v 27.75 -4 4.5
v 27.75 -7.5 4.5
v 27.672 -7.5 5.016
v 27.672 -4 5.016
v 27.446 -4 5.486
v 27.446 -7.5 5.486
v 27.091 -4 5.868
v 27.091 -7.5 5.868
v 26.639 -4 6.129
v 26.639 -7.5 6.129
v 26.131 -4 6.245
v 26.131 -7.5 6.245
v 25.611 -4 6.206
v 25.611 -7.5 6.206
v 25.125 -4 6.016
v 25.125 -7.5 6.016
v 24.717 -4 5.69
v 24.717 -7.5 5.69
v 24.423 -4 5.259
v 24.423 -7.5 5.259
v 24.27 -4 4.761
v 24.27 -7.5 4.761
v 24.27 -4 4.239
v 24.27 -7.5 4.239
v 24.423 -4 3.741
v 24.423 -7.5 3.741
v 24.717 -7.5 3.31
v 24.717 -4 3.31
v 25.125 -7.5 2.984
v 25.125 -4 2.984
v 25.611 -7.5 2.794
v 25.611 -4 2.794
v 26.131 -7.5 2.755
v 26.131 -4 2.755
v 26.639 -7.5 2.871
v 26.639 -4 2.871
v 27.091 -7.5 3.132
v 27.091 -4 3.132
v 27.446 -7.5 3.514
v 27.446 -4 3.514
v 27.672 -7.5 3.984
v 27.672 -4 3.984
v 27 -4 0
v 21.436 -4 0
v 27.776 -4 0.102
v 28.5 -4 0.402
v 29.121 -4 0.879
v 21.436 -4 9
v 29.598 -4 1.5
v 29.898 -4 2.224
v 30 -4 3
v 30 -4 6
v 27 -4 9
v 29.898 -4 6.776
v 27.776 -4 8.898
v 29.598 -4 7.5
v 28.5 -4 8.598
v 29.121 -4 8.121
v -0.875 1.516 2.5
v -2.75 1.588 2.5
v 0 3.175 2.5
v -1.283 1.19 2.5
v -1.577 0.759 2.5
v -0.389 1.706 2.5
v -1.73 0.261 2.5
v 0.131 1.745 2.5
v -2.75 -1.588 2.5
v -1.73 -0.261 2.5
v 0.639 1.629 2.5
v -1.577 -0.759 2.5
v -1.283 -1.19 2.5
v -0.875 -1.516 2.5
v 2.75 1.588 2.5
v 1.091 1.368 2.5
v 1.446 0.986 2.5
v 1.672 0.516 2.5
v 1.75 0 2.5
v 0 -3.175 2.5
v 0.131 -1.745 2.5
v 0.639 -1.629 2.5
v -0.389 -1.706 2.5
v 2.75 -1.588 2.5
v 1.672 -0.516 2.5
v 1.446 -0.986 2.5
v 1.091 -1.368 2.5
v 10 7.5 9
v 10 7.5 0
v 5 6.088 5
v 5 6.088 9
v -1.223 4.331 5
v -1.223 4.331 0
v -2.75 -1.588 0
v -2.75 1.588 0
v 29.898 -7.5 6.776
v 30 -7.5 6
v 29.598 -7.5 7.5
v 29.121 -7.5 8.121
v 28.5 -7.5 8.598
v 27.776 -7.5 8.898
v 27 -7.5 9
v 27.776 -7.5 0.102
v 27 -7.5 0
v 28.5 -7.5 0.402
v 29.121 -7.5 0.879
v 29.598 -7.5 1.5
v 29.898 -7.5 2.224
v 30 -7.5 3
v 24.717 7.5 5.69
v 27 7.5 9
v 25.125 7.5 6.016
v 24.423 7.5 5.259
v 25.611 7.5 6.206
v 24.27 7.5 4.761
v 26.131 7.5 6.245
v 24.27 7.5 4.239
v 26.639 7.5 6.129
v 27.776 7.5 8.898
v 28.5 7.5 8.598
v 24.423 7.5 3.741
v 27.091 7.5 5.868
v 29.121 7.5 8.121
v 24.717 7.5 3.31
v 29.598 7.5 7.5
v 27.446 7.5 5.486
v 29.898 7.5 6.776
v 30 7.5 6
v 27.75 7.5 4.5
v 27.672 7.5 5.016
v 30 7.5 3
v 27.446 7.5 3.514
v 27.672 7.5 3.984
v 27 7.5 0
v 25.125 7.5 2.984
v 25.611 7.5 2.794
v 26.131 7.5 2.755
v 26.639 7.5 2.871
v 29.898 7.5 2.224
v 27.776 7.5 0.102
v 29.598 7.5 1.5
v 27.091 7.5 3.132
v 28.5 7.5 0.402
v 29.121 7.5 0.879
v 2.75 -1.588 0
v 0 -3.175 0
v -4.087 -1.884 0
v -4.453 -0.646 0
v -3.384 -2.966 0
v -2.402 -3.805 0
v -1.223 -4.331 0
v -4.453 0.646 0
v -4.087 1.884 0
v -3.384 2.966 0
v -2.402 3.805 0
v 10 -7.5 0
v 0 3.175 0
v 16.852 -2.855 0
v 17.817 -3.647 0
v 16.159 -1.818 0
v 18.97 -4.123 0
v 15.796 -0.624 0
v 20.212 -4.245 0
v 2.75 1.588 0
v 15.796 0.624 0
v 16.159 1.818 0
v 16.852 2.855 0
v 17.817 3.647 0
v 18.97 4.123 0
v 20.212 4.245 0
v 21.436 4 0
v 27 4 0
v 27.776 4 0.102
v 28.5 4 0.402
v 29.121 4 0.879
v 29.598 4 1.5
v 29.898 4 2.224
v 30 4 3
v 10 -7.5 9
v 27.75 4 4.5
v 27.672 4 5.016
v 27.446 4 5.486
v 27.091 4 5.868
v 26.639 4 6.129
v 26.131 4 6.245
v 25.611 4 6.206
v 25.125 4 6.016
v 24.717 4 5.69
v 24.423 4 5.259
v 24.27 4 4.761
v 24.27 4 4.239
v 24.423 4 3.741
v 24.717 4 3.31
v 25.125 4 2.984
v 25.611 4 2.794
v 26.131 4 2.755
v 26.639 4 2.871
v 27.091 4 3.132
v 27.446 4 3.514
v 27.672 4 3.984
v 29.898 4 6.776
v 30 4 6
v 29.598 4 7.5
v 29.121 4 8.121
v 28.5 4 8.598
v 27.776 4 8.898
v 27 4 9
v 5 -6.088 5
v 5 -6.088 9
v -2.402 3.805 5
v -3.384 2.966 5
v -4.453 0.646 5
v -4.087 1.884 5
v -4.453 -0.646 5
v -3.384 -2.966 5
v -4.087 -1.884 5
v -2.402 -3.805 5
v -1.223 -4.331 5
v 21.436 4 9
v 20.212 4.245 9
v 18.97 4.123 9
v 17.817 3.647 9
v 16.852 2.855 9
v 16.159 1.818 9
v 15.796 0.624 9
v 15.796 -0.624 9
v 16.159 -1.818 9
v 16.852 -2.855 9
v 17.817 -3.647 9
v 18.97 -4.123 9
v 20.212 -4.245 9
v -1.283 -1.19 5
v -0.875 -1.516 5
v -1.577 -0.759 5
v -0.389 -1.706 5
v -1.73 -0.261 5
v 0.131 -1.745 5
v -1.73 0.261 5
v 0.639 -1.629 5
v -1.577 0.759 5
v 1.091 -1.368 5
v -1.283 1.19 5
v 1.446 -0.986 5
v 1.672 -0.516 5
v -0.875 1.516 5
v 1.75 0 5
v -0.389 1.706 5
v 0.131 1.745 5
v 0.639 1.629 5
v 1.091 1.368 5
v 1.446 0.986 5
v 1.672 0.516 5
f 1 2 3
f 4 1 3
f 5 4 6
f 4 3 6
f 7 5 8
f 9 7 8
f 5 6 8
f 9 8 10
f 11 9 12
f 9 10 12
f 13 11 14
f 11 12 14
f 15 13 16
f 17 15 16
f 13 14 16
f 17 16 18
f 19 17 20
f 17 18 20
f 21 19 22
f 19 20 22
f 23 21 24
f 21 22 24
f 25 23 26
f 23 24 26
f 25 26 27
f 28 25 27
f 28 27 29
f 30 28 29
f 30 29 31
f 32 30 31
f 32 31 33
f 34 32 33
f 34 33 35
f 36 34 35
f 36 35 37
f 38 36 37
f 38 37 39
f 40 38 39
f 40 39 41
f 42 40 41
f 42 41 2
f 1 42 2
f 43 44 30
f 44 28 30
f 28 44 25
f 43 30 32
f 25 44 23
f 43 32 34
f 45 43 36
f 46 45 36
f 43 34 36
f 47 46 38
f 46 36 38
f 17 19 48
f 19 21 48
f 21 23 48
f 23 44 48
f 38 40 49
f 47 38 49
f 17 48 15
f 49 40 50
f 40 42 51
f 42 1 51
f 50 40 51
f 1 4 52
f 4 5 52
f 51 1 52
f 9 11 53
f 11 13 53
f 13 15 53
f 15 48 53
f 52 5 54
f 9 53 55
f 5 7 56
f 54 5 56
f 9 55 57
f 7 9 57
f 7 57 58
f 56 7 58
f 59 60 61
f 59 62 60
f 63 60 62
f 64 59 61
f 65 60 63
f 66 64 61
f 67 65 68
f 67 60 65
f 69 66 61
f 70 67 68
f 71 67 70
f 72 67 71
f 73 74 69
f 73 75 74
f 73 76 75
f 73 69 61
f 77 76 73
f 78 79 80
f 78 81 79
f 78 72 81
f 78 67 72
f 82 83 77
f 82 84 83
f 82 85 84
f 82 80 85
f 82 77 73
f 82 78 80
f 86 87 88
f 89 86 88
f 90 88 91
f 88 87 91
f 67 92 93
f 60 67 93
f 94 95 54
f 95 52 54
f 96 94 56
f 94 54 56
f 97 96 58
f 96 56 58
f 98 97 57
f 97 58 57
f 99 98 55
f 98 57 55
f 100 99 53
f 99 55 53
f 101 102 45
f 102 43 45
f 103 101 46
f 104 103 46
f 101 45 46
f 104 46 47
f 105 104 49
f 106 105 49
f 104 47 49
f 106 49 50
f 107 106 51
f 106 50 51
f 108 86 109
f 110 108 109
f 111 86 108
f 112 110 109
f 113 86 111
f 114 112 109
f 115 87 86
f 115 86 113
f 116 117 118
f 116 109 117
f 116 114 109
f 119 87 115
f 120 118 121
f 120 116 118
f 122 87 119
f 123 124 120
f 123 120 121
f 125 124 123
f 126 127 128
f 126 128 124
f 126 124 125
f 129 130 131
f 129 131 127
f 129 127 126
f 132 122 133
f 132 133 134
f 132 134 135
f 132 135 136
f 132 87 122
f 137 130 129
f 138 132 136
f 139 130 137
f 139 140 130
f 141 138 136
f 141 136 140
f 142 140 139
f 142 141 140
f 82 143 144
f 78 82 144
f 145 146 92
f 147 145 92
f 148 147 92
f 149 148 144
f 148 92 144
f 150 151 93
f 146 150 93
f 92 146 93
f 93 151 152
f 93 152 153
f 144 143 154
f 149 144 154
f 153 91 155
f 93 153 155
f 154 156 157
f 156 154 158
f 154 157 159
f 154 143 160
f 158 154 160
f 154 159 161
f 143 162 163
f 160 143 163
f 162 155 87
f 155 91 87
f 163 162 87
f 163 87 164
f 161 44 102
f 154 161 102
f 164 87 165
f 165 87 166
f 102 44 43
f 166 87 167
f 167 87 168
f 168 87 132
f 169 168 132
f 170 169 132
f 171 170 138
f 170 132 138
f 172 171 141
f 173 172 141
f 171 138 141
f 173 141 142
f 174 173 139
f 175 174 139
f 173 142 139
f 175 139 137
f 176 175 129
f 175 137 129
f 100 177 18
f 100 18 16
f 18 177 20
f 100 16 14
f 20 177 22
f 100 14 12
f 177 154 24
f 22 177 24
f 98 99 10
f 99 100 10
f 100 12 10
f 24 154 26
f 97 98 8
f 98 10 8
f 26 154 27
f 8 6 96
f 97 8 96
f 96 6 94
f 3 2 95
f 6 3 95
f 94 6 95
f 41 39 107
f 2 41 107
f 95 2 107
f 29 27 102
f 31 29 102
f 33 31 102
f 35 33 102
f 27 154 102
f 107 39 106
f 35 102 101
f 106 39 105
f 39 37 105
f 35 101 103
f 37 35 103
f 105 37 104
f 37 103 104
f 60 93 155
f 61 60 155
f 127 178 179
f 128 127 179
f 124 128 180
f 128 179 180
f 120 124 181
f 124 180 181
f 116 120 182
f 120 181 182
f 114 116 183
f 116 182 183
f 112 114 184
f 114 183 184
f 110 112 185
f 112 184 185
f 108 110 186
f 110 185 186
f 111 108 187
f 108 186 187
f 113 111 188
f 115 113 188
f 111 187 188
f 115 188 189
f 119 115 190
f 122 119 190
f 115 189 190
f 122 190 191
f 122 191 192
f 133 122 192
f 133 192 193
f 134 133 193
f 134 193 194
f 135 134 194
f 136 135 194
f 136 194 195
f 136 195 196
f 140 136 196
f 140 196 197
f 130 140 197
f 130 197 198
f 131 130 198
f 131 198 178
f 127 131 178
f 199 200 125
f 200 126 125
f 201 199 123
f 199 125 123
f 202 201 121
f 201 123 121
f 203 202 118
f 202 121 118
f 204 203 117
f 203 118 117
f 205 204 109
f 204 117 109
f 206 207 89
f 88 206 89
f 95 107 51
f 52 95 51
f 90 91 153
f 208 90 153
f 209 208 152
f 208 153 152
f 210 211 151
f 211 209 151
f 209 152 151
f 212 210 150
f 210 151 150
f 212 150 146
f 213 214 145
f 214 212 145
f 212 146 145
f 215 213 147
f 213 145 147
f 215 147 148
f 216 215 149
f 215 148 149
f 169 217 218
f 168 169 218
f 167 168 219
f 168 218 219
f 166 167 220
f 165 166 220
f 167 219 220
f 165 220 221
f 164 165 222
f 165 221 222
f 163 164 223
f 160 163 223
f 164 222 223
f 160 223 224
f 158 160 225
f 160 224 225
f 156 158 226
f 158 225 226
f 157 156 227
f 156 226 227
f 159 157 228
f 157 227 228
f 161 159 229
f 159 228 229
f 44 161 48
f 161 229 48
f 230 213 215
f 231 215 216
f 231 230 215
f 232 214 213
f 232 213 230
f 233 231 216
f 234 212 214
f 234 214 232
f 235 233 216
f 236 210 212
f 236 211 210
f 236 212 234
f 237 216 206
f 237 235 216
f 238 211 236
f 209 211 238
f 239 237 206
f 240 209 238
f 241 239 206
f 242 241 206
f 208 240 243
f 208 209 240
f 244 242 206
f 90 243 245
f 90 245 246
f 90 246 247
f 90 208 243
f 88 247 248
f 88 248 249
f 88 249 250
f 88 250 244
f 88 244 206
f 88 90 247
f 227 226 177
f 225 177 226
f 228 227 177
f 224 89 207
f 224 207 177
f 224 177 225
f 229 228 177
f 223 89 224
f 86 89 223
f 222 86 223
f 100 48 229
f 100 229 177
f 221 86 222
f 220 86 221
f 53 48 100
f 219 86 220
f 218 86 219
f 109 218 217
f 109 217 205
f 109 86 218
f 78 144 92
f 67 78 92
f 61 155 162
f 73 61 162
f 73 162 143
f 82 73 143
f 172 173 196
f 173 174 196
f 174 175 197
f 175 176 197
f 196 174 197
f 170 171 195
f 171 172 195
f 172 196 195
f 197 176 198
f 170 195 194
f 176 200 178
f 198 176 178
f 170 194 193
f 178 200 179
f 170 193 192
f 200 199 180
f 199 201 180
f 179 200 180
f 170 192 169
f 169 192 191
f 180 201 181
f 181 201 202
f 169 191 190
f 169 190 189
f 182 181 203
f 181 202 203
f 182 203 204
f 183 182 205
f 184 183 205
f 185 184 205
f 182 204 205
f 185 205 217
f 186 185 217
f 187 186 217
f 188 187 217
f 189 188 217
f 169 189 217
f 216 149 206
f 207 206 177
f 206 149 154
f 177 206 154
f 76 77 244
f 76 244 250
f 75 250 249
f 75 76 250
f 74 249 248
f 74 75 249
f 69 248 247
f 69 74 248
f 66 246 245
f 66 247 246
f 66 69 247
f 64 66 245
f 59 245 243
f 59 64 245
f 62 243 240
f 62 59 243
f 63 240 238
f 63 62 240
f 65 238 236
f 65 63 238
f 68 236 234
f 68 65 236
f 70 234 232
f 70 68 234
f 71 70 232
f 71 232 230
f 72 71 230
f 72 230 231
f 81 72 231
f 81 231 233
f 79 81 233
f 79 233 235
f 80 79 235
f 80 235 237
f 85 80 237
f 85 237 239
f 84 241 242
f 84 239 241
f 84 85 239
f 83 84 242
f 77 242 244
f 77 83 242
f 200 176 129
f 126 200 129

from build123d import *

# Parameters (mm, degrees)
F0_R     = 1.75
F0_W     = 20
F0_H     = 15
F1_DEPTH = 9
F2_W     = 12.9252894117
F2_H     = 15.5579744821
F3_DEPTH = 4
F5_DEPTH = 2.5
F7_DEPTH = 25
F8_R     = 1.75
F9_DEPTH = 25
F10_R    = 3


with BuildPart() as f1:
    # F0 (on Top) → F1 (new body)
    with BuildSketch(Plane.XY):
        with BuildLine():
            ThreePointArc((-1.2229712186, -4.3306282914), (2.7153848269, -3.5884098486), (4.5, 0))
            ThreePointArc((4.5, 0), (2.7153848269, 3.5884098486), (-1.2229712186, 4.3306282914))
            ThreePointArc((-1.2229712186, 4.3306282914), (-4.5, 0), (-1.2229712186, -4.3306282914))
        make_face()
        Circle(F0_R, mode=Mode.SUBTRACT)
        with BuildLine():
            ThreePointArc((-1.2229712186, 4.3306282914), (2.7153848269, 3.5884098486), (4.5, 0))
            ThreePointArc((4.5, 0), (2.7153848269, -3.5884098486), (-1.2229712186, -4.3306282914))
            Line((-1.2229712186, -4.3306282914), (10, -7.5))
            Line((10, -7.5), (10, 7.5))
            Line((10, 7.5), (-1.2229712186, 4.3306282914))
        make_face()
        with Locations((20, 0)):
            Rectangle(F0_W, F0_H)
    extrude(amount=F1_DEPTH)

    # F2 (on face) → F3 (cut)
    with BuildSketch(Plane.XY.offset(9)):
        with Locations((-1.4626447058, -0.6304618437)):
            Rectangle(F2_W, F2_H)
    extrude(amount=-F3_DEPTH, mode=Mode.SUBTRACT)

    # F4 (on face) → F5 (cut)
    with BuildSketch(Plane(origin=(0, 0, 0), x_dir=(1, 0, 0), z_dir=(0, 0, -1))):
        Polygon((2.75, -1.5877132403), (2.75, 1.5877132403), (0, 3.1754264805), (-2.75, 1.5877132403), (-2.75, -1.5877132403), (0, -3.1754264805), align=None)
    extrude(amount=-F5_DEPTH, mode=Mode.SUBTRACT)

    # F6 (on face) → F7 (cut)
    with BuildSketch(Plane.XY.offset(9)):
        with BuildLine():
            ThreePointArc((21.4361406616, -4), (23.4760680238, -2.4452916174), (24.25, 0))
            ThreePointArc((24.25, 0), (23.4760680238, 2.4452916174), (21.4361406616, 4))
            Line((21.4361406616, 4), (21.4361406616, -4))
        make_face()
        with BuildLine():
            ThreePointArc((21.4361406616, 4), (23.4760680238, 2.4452916174), (24.25, 0))
            ThreePointArc((24.25, 0), (23.4760680238, -2.4452916174), (21.4361406616, -4))
            Line((21.4361406616, -4), (30, -4))
            Line((30, -4), (30, 4))
            Line((30, 4), (21.4361406616, 4))
        make_face()
        with BuildLine():
            Line((21.4361406616, -4), (21.4361406616, 4))
            ThreePointArc((21.4361406616, 4), (15.75, 0), (21.4361406616, -4))
        make_face()
    extrude(amount=-F7_DEPTH, mode=Mode.SUBTRACT)

    # F8 (on face) → F9 (cut)
    with BuildSketch(Plane.XZ.offset(7.5)):
        with Locations((26, 4.5)):
            Circle(F8_R)
    extrude(amount=-F9_DEPTH, mode=Mode.SUBTRACT)

    # F10
    f10_edges = [f1.edges().sort_by_distance(p)[0] for p in [
        (30, -5.75, 9),
        (30, 5.75, 9),
        (30, -5.75, 0),
        (30, 5.75, 0),
    ]]
    fillet(f10_edges, radius=F10_R)


solid = f1.part
